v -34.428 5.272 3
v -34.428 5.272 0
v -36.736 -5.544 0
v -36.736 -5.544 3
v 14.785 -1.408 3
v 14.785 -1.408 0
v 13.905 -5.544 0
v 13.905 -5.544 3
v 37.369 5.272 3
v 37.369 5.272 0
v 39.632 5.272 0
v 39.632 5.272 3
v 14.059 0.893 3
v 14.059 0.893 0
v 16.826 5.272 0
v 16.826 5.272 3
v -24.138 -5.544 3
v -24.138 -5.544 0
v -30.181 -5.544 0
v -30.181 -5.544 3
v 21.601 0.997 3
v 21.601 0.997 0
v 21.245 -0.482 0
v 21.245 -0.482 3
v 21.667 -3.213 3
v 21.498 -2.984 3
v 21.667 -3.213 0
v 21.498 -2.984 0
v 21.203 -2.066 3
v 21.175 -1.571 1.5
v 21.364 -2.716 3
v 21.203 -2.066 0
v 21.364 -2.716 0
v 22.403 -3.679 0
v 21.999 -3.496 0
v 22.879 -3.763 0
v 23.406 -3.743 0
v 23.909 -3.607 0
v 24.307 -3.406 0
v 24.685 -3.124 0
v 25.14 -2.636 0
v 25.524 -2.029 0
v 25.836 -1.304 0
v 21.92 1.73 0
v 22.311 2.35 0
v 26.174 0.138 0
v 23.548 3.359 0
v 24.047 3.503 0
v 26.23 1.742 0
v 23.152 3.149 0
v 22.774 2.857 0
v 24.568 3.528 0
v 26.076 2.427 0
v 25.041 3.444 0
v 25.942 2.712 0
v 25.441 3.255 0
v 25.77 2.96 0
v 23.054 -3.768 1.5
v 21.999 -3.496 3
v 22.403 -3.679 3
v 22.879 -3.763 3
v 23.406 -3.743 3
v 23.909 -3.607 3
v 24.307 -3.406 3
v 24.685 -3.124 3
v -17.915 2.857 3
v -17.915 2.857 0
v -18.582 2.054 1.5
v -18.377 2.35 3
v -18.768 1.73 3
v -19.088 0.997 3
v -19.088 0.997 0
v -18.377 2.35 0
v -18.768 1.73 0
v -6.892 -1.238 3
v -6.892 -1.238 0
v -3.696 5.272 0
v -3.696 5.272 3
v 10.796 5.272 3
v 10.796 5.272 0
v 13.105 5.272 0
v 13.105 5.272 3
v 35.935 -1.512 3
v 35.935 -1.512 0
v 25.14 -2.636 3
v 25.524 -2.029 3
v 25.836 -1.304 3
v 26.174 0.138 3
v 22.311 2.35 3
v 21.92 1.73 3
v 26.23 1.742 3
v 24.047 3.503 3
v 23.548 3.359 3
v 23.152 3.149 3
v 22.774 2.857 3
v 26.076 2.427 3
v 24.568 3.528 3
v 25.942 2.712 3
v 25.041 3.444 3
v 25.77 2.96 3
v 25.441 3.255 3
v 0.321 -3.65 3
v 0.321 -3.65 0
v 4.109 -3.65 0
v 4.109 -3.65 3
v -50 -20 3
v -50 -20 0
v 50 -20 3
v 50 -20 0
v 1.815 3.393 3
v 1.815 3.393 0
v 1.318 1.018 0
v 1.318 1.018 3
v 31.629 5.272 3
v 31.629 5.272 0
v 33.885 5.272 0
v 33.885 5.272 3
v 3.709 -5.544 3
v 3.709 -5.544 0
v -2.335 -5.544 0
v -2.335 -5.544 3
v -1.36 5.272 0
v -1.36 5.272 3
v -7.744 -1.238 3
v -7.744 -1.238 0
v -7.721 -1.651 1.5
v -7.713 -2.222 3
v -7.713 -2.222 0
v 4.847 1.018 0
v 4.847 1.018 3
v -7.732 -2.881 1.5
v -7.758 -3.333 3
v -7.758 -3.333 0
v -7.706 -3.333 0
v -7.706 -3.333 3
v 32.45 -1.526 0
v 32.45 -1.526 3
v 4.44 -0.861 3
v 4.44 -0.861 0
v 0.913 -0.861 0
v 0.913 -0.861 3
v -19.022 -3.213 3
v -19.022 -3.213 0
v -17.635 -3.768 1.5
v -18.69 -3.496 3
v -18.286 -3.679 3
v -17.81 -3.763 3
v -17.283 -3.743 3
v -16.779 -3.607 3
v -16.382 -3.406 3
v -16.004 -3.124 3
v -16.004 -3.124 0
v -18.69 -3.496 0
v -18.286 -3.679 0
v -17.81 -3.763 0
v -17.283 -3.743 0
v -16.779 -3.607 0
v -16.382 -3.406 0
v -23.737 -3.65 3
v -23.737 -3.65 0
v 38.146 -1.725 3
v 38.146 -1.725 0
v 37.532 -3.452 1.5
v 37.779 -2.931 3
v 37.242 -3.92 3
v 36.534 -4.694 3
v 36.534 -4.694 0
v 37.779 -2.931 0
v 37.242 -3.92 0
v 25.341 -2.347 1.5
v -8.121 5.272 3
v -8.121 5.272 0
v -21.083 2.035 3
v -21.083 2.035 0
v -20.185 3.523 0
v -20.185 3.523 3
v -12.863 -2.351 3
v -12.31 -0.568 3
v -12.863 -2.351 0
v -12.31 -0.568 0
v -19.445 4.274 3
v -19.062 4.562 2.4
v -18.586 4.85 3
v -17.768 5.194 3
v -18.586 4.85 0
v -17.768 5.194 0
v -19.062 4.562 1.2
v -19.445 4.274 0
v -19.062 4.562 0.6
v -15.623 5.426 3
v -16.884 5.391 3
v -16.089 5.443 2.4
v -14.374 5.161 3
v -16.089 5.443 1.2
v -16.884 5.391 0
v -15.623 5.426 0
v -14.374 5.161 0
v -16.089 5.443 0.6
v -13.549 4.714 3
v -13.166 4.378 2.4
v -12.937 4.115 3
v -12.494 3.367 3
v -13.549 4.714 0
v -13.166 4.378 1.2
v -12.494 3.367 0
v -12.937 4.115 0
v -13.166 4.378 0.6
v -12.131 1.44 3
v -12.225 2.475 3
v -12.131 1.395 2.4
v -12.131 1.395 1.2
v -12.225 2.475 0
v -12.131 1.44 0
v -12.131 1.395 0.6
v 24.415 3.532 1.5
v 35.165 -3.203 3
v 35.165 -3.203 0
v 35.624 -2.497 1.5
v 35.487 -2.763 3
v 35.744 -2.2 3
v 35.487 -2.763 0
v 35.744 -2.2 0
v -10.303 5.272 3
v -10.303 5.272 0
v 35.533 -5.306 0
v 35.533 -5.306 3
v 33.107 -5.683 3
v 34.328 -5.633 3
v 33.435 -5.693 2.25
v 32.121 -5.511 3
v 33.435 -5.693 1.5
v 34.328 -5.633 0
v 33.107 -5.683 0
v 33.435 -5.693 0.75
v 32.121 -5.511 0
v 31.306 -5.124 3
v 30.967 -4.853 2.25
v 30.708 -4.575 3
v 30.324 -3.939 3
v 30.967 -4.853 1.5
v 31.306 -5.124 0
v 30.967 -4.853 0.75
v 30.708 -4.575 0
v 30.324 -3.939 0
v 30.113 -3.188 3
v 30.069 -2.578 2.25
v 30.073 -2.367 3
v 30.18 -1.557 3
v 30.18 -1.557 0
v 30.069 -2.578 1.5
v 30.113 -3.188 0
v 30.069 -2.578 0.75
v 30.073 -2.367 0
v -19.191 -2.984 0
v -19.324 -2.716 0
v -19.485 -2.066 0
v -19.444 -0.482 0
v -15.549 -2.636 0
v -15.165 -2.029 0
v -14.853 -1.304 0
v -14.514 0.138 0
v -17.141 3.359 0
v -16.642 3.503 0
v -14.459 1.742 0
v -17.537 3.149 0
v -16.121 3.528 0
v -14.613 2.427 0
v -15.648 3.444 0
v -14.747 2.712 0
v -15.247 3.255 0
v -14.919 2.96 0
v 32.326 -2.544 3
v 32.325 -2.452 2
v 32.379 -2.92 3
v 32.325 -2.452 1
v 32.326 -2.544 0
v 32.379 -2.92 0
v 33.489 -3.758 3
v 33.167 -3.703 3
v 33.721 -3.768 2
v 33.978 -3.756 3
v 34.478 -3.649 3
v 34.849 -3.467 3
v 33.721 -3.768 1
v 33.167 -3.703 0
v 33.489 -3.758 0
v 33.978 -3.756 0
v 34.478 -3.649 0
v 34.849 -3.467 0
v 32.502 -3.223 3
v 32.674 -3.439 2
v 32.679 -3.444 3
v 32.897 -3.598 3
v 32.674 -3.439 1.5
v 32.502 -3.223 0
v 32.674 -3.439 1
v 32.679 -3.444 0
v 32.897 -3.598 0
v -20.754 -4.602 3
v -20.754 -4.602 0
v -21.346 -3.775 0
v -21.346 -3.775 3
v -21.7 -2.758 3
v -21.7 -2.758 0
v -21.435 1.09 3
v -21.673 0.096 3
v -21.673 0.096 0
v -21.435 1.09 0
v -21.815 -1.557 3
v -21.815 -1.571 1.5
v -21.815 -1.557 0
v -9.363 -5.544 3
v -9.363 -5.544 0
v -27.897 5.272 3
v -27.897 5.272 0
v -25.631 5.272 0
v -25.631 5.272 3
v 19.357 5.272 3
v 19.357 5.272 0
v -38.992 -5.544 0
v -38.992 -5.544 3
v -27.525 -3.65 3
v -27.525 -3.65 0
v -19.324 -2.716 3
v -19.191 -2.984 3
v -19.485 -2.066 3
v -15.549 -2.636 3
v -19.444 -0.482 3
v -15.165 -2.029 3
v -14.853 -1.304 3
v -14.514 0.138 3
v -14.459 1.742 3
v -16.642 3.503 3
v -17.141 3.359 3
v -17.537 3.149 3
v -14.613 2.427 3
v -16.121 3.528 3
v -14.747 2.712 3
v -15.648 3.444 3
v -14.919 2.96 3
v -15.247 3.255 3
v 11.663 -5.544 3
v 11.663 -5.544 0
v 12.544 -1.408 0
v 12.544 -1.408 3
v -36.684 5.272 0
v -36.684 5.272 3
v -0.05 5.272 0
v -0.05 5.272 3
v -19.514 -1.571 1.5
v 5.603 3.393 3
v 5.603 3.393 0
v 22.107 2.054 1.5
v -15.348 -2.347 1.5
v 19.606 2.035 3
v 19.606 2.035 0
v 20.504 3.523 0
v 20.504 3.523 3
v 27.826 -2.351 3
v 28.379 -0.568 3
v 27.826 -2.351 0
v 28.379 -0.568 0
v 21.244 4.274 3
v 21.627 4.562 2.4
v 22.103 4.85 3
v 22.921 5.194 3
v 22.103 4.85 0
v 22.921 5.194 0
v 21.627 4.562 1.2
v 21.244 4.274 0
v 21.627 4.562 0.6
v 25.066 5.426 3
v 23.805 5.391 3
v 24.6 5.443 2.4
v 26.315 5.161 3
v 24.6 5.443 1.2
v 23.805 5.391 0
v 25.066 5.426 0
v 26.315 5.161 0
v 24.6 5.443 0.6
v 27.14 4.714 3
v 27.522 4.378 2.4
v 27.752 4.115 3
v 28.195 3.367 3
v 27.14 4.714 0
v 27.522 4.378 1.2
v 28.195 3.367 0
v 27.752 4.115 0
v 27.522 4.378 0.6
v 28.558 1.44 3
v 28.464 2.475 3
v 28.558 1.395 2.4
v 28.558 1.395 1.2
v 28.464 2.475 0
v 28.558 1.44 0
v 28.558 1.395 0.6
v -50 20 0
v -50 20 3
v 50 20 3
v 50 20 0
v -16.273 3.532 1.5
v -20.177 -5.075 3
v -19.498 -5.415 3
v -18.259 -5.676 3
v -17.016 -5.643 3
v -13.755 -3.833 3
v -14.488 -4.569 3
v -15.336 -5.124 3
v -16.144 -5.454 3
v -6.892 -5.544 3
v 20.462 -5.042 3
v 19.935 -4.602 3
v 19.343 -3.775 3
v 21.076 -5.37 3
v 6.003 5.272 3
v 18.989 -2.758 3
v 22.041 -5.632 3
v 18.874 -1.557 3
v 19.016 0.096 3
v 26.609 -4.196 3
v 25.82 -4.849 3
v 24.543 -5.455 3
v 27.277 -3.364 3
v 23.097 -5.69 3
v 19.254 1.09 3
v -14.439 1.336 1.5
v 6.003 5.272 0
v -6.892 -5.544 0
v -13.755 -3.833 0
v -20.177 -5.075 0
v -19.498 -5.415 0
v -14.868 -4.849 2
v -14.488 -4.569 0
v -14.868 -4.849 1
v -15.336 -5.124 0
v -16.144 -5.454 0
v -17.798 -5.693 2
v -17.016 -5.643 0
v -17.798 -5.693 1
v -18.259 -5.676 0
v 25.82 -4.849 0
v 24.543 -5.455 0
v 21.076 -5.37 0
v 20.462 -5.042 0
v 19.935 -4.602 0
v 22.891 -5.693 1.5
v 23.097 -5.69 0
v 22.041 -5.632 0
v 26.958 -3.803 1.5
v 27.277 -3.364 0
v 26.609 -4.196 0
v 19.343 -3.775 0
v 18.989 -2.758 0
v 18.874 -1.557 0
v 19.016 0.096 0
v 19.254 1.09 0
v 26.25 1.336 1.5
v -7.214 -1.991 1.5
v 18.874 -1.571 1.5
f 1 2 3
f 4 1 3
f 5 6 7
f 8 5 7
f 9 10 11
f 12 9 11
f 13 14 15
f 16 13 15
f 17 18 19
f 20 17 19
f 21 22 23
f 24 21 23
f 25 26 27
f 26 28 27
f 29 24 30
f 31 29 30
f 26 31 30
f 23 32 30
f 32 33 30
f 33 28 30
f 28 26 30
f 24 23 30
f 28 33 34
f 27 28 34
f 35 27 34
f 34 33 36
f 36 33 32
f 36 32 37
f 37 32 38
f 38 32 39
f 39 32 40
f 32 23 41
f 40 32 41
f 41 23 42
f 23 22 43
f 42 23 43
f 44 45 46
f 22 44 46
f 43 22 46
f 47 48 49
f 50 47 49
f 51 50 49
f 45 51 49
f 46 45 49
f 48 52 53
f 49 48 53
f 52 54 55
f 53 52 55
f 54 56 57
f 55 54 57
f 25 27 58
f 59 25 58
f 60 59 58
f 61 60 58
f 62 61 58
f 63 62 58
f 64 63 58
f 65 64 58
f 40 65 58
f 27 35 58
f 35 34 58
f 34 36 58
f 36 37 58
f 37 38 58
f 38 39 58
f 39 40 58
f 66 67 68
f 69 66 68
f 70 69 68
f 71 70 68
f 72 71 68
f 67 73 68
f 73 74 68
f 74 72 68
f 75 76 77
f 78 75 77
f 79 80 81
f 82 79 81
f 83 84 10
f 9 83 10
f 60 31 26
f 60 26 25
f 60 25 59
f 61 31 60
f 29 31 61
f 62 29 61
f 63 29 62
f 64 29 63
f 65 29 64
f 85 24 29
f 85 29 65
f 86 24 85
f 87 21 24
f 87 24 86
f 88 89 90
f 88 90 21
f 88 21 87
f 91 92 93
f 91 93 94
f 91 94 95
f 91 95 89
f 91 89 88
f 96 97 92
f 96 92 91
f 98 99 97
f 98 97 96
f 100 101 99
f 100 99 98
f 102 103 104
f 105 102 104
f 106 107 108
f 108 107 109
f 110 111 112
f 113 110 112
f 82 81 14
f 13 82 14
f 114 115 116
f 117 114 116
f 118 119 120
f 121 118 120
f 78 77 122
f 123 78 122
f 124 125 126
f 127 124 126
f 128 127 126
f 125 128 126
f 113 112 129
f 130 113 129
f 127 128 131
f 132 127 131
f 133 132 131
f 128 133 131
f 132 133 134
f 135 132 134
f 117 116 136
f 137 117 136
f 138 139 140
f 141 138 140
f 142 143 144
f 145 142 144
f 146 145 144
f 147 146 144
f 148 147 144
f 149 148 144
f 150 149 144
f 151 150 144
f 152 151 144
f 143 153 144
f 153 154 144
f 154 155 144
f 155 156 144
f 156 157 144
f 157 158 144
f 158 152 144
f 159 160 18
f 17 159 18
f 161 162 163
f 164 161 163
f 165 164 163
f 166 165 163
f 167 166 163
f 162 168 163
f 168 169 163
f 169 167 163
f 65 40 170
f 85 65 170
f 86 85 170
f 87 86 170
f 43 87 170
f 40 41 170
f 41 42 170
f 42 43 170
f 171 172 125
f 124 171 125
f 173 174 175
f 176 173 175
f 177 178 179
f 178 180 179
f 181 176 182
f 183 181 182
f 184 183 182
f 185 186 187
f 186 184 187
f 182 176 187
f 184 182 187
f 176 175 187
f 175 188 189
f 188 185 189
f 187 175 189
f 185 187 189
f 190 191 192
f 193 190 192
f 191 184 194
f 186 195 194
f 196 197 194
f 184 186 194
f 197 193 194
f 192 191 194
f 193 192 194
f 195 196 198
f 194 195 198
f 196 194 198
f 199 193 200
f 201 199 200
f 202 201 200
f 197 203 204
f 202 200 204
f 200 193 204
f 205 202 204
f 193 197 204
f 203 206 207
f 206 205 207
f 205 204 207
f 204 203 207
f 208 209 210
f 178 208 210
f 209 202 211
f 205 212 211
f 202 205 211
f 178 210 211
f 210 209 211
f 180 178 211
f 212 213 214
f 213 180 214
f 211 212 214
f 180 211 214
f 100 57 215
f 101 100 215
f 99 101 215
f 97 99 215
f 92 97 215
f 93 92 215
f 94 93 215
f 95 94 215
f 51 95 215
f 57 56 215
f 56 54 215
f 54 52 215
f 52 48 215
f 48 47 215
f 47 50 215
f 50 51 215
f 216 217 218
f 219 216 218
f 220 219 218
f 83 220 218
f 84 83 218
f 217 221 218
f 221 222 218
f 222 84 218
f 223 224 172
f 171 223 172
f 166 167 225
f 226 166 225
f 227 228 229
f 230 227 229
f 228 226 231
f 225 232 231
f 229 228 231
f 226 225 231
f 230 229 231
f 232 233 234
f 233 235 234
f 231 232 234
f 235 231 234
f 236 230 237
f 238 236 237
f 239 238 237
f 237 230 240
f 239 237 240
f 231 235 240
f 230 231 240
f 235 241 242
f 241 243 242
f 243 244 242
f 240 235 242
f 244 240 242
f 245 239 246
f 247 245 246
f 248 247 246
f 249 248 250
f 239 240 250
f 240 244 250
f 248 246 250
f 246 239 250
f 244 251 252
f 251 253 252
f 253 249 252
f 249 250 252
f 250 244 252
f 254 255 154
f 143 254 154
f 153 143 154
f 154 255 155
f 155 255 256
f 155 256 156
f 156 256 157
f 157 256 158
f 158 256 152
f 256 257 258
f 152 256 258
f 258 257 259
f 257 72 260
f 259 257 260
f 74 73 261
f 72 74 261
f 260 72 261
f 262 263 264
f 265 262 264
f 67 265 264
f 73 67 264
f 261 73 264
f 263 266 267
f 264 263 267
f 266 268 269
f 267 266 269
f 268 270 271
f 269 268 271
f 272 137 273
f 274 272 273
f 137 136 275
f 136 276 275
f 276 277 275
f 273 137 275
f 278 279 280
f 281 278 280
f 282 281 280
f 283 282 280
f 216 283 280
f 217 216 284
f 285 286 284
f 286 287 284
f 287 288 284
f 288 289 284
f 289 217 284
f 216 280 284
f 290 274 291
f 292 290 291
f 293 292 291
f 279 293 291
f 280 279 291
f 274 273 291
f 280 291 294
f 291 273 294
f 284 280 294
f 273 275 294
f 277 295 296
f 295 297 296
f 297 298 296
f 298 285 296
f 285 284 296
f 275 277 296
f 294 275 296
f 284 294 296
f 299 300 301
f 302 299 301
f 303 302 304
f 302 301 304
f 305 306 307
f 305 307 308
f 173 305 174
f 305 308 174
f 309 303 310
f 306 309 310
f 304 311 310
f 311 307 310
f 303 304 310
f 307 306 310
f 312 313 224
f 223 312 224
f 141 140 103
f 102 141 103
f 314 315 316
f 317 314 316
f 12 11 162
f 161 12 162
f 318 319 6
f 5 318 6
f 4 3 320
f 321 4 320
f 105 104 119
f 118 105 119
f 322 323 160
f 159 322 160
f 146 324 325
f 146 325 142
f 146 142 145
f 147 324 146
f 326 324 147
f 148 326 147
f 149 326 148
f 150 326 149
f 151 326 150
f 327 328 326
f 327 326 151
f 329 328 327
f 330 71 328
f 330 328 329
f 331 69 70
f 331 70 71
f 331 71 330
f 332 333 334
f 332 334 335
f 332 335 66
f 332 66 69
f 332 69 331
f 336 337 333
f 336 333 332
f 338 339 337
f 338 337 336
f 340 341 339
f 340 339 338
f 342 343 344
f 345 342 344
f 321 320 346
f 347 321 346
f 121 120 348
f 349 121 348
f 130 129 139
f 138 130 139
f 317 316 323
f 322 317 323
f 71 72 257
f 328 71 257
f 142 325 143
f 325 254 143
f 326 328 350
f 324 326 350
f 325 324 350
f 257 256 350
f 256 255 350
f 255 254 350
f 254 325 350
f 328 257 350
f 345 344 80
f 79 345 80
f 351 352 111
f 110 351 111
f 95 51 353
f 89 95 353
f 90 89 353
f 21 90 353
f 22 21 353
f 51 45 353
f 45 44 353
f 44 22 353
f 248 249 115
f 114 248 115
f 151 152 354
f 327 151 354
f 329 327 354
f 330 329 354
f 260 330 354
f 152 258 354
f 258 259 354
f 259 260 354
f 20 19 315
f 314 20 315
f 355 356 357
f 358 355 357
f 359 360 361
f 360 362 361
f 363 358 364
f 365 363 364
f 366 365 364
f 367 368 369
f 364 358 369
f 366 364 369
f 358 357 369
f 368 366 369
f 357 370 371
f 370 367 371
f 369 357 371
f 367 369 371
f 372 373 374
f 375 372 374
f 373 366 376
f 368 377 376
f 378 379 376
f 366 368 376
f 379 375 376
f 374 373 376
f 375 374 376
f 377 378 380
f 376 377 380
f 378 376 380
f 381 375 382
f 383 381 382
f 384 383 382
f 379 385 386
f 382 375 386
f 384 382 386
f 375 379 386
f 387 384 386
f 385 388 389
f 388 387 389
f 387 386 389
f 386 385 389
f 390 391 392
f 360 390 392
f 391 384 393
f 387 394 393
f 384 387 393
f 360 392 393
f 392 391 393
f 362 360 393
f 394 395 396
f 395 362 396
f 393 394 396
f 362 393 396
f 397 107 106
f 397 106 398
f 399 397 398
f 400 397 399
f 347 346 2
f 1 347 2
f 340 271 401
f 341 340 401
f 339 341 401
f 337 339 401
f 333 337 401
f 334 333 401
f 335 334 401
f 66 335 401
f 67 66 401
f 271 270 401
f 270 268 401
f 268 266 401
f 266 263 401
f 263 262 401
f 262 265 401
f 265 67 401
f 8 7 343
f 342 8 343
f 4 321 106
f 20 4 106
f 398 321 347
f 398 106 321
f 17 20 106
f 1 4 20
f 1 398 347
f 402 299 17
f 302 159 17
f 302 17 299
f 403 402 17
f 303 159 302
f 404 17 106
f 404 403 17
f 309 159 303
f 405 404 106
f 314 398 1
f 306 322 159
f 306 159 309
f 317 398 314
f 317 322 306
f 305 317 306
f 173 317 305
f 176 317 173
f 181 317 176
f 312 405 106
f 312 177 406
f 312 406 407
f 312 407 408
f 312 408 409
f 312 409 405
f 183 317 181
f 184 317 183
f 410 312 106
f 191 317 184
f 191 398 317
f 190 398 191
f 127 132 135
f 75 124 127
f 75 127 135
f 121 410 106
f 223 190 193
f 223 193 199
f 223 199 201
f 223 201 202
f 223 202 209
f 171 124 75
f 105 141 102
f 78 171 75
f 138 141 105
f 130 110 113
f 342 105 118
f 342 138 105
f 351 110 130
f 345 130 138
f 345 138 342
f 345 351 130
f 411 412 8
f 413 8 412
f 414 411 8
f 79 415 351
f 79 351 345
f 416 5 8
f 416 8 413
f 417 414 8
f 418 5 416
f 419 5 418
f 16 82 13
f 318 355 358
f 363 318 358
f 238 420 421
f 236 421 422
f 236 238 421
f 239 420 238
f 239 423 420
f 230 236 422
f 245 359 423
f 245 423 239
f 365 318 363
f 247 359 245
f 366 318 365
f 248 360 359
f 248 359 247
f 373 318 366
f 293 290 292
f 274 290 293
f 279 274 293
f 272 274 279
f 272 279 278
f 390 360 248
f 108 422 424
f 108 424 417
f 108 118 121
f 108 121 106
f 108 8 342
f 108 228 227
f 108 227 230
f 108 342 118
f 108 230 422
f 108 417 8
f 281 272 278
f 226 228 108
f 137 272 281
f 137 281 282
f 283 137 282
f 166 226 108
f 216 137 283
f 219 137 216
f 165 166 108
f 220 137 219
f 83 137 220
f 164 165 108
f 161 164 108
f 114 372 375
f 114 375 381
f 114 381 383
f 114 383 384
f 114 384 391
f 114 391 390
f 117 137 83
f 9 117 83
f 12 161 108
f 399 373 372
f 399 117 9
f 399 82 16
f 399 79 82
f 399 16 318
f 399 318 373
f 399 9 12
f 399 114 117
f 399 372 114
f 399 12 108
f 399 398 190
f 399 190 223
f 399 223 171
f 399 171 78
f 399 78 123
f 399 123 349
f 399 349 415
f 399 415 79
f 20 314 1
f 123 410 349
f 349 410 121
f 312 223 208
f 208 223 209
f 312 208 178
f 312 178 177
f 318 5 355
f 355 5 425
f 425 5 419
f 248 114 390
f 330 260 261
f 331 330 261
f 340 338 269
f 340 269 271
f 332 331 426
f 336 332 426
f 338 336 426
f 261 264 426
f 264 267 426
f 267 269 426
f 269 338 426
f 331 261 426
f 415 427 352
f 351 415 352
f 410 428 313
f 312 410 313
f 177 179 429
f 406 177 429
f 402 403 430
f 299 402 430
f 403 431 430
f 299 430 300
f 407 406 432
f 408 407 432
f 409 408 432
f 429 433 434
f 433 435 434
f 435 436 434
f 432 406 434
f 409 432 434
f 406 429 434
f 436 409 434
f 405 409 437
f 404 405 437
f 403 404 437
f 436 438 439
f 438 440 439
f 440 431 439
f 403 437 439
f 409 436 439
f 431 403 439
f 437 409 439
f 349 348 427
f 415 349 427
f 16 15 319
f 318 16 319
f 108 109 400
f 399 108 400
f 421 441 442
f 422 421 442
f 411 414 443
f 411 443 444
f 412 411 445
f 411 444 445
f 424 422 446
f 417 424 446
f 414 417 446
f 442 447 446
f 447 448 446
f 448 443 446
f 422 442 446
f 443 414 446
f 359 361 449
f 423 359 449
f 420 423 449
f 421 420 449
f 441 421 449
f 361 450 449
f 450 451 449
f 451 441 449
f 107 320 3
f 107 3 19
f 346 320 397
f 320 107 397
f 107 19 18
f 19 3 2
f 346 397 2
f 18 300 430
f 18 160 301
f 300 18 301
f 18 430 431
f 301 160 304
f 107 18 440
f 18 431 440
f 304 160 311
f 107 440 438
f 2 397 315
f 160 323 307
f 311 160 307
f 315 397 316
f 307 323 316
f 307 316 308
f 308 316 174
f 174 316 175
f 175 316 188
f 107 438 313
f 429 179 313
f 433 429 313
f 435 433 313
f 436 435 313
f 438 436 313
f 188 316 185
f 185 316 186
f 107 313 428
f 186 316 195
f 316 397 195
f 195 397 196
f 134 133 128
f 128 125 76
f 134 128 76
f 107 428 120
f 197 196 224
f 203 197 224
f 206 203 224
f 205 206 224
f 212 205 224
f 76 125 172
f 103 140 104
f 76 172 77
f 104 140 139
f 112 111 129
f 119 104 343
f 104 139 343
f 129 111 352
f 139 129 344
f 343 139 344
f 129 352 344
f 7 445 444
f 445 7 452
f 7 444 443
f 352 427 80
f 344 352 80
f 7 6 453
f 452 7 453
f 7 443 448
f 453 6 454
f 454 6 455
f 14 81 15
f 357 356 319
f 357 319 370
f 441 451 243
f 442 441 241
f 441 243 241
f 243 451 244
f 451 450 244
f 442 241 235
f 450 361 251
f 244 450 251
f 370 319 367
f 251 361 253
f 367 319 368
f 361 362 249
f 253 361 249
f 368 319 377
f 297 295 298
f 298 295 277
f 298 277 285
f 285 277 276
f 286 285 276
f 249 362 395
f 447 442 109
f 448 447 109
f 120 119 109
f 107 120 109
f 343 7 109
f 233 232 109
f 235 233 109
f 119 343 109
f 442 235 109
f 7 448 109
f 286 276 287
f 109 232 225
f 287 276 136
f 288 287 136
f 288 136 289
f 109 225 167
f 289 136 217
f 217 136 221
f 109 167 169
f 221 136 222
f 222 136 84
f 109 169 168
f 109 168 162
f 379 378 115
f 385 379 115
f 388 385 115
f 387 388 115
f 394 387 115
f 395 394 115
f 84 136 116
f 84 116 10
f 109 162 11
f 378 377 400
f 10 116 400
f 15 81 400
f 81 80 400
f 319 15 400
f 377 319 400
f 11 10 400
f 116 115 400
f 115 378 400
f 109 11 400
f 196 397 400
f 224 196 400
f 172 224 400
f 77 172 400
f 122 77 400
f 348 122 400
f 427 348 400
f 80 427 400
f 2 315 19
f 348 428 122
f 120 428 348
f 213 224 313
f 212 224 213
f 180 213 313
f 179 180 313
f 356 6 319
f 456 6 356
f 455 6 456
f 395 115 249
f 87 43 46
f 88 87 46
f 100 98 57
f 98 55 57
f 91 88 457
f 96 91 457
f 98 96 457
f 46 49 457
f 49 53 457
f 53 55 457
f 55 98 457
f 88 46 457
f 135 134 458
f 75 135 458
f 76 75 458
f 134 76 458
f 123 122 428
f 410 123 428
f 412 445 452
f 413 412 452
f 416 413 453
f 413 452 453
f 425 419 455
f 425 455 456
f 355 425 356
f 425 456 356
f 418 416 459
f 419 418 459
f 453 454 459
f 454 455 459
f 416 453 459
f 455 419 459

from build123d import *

# Parameters (mm, degrees)
F1_DEPTH = 3
F0_W     = 100
F0_H     = 40


with BuildPart() as f1:
    # F0 (on Top) → F1 (new body)
    with BuildSketch(Plane.XY):
        with BuildLine():
            add(Edge.make_bspline(
                [(-14.9193627329, 2.9595110785), (-15.3999214119, 3.5323938388), (-16.2734492571, 3.5323938388)],
                knots=[0, 0, 0, 1, 1, 1], degree=2))
            add(Edge.make_bspline(
                [(-16.2734492571, 3.5323938388), (-17.1682826595, 3.5323938388), (-17.9151608035, 2.8565342187)],
                knots=[0, 0, 0, 1, 1, 1], degree=2))
            add(Edge.make_bspline(
                [(-17.9151608035, 2.8565342187), (-18.6620389476, 2.1806745987), (-19.0881500916, 0.9970325321)],
                knots=[0, 0, 0, 1, 1, 1], degree=2))
            add(Edge.make_bspline(
                [(-19.0881500916, 0.9970325321), (-19.5142612356, -0.1866095346), (-19.5142612356, -1.5714707525)],
                knots=[0, 0, 0, 1, 1, 1], degree=2))
            add(Edge.make_bspline(
                [(-19.5142612356, -1.5714707525), (-19.5142612356, -2.6580541697), (-19.0218661358, -3.213182299)],
                knots=[0, 0, 0, 1, 1, 1], degree=2))
            add(Edge.make_bspline(
                [(-19.0218661358, -3.213182299), (-18.5294710361, -3.7683104282), (-17.6346376337, -3.7683104282)],
                knots=[0, 0, 0, 1, 1, 1], degree=2))
            add(Edge.make_bspline(
                [(-17.6346376337, -3.7683104282), (-16.7398042314, -3.7683104282), (-16.0035788659, -3.124409144)],
                knots=[0, 0, 0, 1, 1, 1], degree=2))
            add(Edge.make_bspline(
                [(-16.0035788659, -3.124409144), (-15.2673535005, -2.4805078597), (-14.8530787771, -1.3039676455)],
                knots=[0, 0, 0, 1, 1, 1], degree=2))
            add(Edge.make_bspline(
                [(-14.8530787771, -1.3039676455), (-14.4388040538, -0.1274274312), (-14.4388040538, 1.3355541631)],
                knots=[0, 0, 0, 1, 1, 1], degree=2))
            add(Edge.make_bspline(
                [(-14.4388040538, 1.3355541631), (-14.4388040538, 2.3866283183), (-14.9193627329, 2.9595110785)],
                knots=[0, 0, 0, 1, 1, 1], degree=2))
        make_face()
    extrude(amount=F1_DEPTH)


with BuildPart() as f1b:
    # F0 (on Top) → F1, piece 2 (new body)
    with BuildSketch(Plane.XY):
        with BuildLine():
            add(Edge.make_bspline(
                [(25.7695169499, 2.9595110785), (25.2889582709, 3.5323938388), (24.4154304257, 3.5323938388)],
                knots=[0, 0, 0, 1, 1, 1], degree=2))
            add(Edge.make_bspline(
                [(24.4154304257, 3.5323938388), (23.5205970233, 3.5323938388), (22.7737188793, 2.8565342187)],
                knots=[0, 0, 0, 1, 1, 1], degree=2))
            add(Edge.make_bspline(
                [(22.7737188793, 2.8565342187), (22.0268407352, 2.1806745987), (21.6007295912, 0.9970325321)],
                knots=[0, 0, 0, 1, 1, 1], degree=2))
            add(Edge.make_bspline(
                [(21.6007295912, 0.9970325321), (21.1746184472, -0.1866095346), (21.1746184472, -1.5714707525)],
                knots=[0, 0, 0, 1, 1, 1], degree=2))
            add(Edge.make_bspline(
                [(21.1746184472, -1.5714707525), (21.1746184472, -2.6580541697), (21.6670135469, -3.213182299)],
                knots=[0, 0, 0, 1, 1, 1], degree=2))
            add(Edge.make_bspline(
                [(21.6670135469, -3.213182299), (22.1594086467, -3.7683104282), (23.054242049, -3.7683104282)],
                knots=[0, 0, 0, 1, 1, 1], degree=2))
            add(Edge.make_bspline(
                [(23.054242049, -3.7683104282), (23.9490754514, -3.7683104282), (24.6853008169, -3.124409144)],
                knots=[0, 0, 0, 1, 1, 1], degree=2))
            add(Edge.make_bspline(
                [(24.6853008169, -3.124409144), (25.4215261823, -2.4805078597), (25.8358009056, -1.3039676455)],
                knots=[0, 0, 0, 1, 1, 1], degree=2))
            add(Edge.make_bspline(
                [(25.8358009056, -1.3039676455), (26.250075629, -0.1274274312), (26.250075629, 1.3355541631)],
                knots=[0, 0, 0, 1, 1, 1], degree=2))
            add(Edge.make_bspline(
                [(26.250075629, 1.3355541631), (26.250075629, 2.3866283183), (25.7695169499, 2.9595110785)],
                knots=[0, 0, 0, 1, 1, 1], degree=2))
        make_face()
    extrude(amount=F1_DEPTH)


with BuildPart() as f1c:
    # F0 (on Top) → F1, piece 3 (new body)
    with BuildSketch(Plane.XY):
        Rectangle(F0_W, F0_H)
        Polygon((-36.7362533052, -5.5437735282), (-38.9922750842, -5.5437735282), (-36.6841730542, 5.2723476768), (-34.4281512752, 5.2723476768), align=None, mode=Mode.SUBTRACT)
        Polygon((-24.1375671479, -5.5437735282), (-30.1812435401, -5.5437735282), (-27.8968143515, 5.2723476768), (-25.631323436, 5.2723476768), (-27.5251507426, -3.6499462216), (-23.7374961293, -3.6499462216), align=None, mode=Mode.SUBTRACT)
        with BuildLine():
            add(Edge.make_bspline(
                [(-13.1663888322, 4.3775142744), (-12.1307020239, 3.3122364144), (-12.1307020239, 1.3947362664)],
                knots=[0, 0, 0, 1, 1, 1], degree=2))
            add(Edge.make_bspline(
                [(-12.1307020239, 1.3947362664), (-12.1307020239, -0.6979429074), (-12.8633764631, -2.3514908745)],
                knots=[0, 0, 0, 1, 1, 1], degree=2))
            add(Edge.make_bspline(
                [(-12.8633764631, -2.3514908745), (-13.5960509024, -4.0050388416), (-14.868466124, -4.8489756351)],
                knots=[0, 0, 0, 1, 1, 1], degree=2))
            add(Edge.make_bspline(
                [(-14.868466124, -4.8489756351), (-16.1408813456, -5.6929124286), (-17.7979802389, -5.6929124286)],
                knots=[0, 0, 0, 1, 1, 1], degree=2))
            add(Edge.make_bspline(
                [(-17.7979802389, -5.6929124286), (-19.6918075456, -5.6929124286), (-20.7535344793, -4.6015944431)],
                knots=[0, 0, 0, 1, 1, 1], degree=2))
            add(Edge.make_bspline(
                [(-20.7535344793, -4.6015944431), (-21.8152614131, -3.5102764577), (-21.8152614131, -1.5714707525)],
                knots=[0, 0, 0, 1, 1, 1], degree=2))
            add(Edge.make_bspline(
                [(-21.8152614131, -1.5714707525), (-21.8152614131, 0.3886405098), (-21.0825869739, 2.0350866245)],
                knots=[0, 0, 0, 1, 1, 1], degree=2))
            add(Edge.make_bspline(
                [(-21.0825869739, 2.0350866245), (-20.3499125346, 3.6815327392), (-19.0621099661, 4.5621624368)],
                knots=[0, 0, 0, 1, 1, 1], degree=2))
            add(Edge.make_bspline(
                [(-19.0621099661, 4.5621624368), (-17.7743073976, 5.4427921344), (-16.0888010947, 5.4427921344)],
                knots=[0, 0, 0, 1, 1, 1], degree=2))
            add(Edge.make_bspline(
                [(-16.0888010947, 5.4427921344), (-14.2020756405, 5.4427921344), (-13.1663888322, 4.3775142744)],
                knots=[0, 0, 0, 1, 1, 1], degree=2))
        make_face(mode=Mode.SUBTRACT)
        with BuildLine():
            Line((-7.7583282297, -3.3327301477), (-7.7062479788, -3.3327301477))
            add(Edge.make_bspline(
                [(-7.7062479788, -3.3327301477), (-7.1286306503, -1.6969368116), (-6.8919022369, -1.2376836898)],
                knots=[0, 0, 0, 1, 1, 1], degree=2))
            Line((-6.8919022369, -1.2376836898), (-3.696068657, 5.2723476768))
            Line((-3.696068657, 5.2723476768), (-1.3595592175, 5.2723476768))
            Line((-1.3595592175, 5.2723476768), (-6.8919022369, -5.5437735282))
            Line((-6.8919022369, -5.5437735282), (-9.3633468721, -5.5437735282))
            Line((-9.3633468721, -5.5437735282), (-10.303158673, 5.2723476768))
            Line((-10.303158673, 5.2723476768), (-8.1205227021, 5.2723476768))
            Line((-8.1205227021, 5.2723476768), (-7.7441245249, -1.2376836898))
            add(Edge.make_bspline(
                [(-7.7441245249, -1.2376836898), (-7.7133498312, -1.5714707525), (-7.7133498312, -2.2224738892)],
                knots=[0, 0, 0, 1, 1, 1], degree=2))
            add(Edge.make_bspline(
                [(-7.7133498312, -2.2224738892), (-7.727553536, -2.9847393801), (-7.7583282297, -3.3327301477)],
                knots=[0, 0, 0, 1, 1, 1], degree=2))
        make_face(mode=Mode.SUBTRACT)
        Polygon((4.1088671304, -3.6499462216), (3.7087961119, -5.5437735282), (-2.3348802804, -5.5437735282), (-0.0504510917, 5.2723476768), (6.002694437, 5.2723476768), (5.6026234185, 3.3927240749), (1.8149688053, 3.3927240749), (1.3178391373, 1.0183380893), (4.84745978, 1.0183380893), (4.4402869091, -0.8612855126), (0.9130335505, -0.8612855126), (0.3212125172, -3.6499462216), align=None, mode=Mode.SUBTRACT)
        Polygon((13.1045468369, 5.2723476768), (14.0585623426, 0.8928720302), (16.8259174944, 5.2723476768), (19.3565442329, 5.2723476768), (14.7853185715, -1.4081281474), (13.9046888739, -5.5437735282), (11.6628707997, -5.5437735282), (12.5435004973, -1.4081281474), (10.7964448069, 5.2723476768), align=None, mode=Mode.SUBTRACT)
        with BuildLine():
            add(Edge.make_bspline(
                [(27.5224908506, 4.3775142744), (28.5581776589, 3.3122364144), (28.5581776589, 1.3947362664)],
                knots=[0, 0, 0, 1, 1, 1], degree=2))
            add(Edge.make_bspline(
                [(28.5581776589, 1.3947362664), (28.5581776589, -0.6979429074), (27.8255032197, -2.3514908745)],
                knots=[0, 0, 0, 1, 1, 1], degree=2))
            add(Edge.make_bspline(
                [(27.8255032197, -2.3514908745), (27.0928287804, -4.0050388416), (25.8204135588, -4.8489756351)],
                knots=[0, 0, 0, 1, 1, 1], degree=2))
            add(Edge.make_bspline(
                [(25.8204135588, -4.8489756351), (24.5479983371, -5.6929124286), (22.8908994438, -5.6929124286)],
                knots=[0, 0, 0, 1, 1, 1], degree=2))
            add(Edge.make_bspline(
                [(22.8908994438, -5.6929124286), (20.9970721372, -5.6929124286), (19.9353452035, -4.6015944431)],
                knots=[0, 0, 0, 1, 1, 1], degree=2))
            add(Edge.make_bspline(
                [(19.9353452035, -4.6015944431), (18.8736182697, -3.5102764577), (18.8736182697, -1.5714707525)],
                knots=[0, 0, 0, 1, 1, 1], degree=2))
            add(Edge.make_bspline(
                [(18.8736182697, -1.5714707525), (18.8736182697, 0.3886405098), (19.6062927089, 2.0350866245)],
                knots=[0, 0, 0, 1, 1, 1], degree=2))
            add(Edge.make_bspline(
                [(19.6062927089, 2.0350866245), (20.3389671482, 3.6815327392), (21.6267697167, 4.5621624368)],
                knots=[0, 0, 0, 1, 1, 1], degree=2))
            add(Edge.make_bspline(
                [(21.6267697167, 4.5621624368), (22.9145722852, 5.4427921344), (24.6000785881, 5.4427921344)],
                knots=[0, 0, 0, 1, 1, 1], degree=2))
            add(Edge.make_bspline(
                [(24.6000785881, 5.4427921344), (26.4868040423, 5.4427921344), (27.5224908506, 4.3775142744)],
                knots=[0, 0, 0, 1, 1, 1], degree=2))
        make_face(mode=Mode.SUBTRACT)
        with BuildLine():
            Line((37.369209203, 5.2723476768), (39.6323328344, 5.2723476768))
            Line((39.6323328344, 5.2723476768), (38.1456783987, -1.7253442212))
            add(Edge.make_bspline(
                [(38.1456783987, -1.7253442212), (37.724301823, -3.6949246201), (36.5335579039, -4.6939185243)],
                knots=[0, 0, 0, 1, 1, 1], degree=2))
            add(Edge.make_bspline(
                [(36.5335579039, -4.6939185243), (35.3428139849, -5.6929124286), (33.4347829735, -5.6929124286)],
                knots=[0, 0, 0, 1, 1, 1], degree=2))
            add(Edge.make_bspline(
                [(33.4347829735, -5.6929124286), (31.8652735931, -5.6929124286), (30.9668892645, -4.8525265613)],
                knots=[0, 0, 0, 1, 1, 1], degree=2))
            add(Edge.make_bspline(
                [(30.9668892645, -4.8525265613), (30.0685049359, -4.012140694), (30.0685049359, -2.5775665092)],
                knots=[0, 0, 0, 1, 1, 1], degree=2))
            add(Edge.make_bspline(
                [(30.0685049359, -2.5775665092), (30.0685049359, -2.0449275792), (30.1797672902, -1.5572670477)],
                knots=[0, 0, 0, 1, 1, 1], degree=2))
            Line((30.1797672902, -1.5572670477), (31.6285451798, 5.2723476768))
            Line((31.6285451798, 5.2723476768), (33.8845669588, 5.2723476768))
            Line((33.8845669588, 5.2723476768), (32.449992774, -1.526492354))
            add(Edge.make_bspline(
                [(32.449992774, -1.526492354), (32.324526715, -2.0733349888), (32.324526715, -2.4521004501)],
                knots=[0, 0, 0, 1, 1, 1], degree=2))
            add(Edge.make_bspline(
                [(32.324526715, -2.4521004501), (32.324526715, -3.7683104282), (33.7212243536, -3.7683104282)],
                knots=[0, 0, 0, 1, 1, 1], degree=2))
            add(Edge.make_bspline(
                [(33.7212243536, -3.7683104282), (34.6326287449, -3.7683104282), (35.1652676749, -3.2025295204)],
                knots=[0, 0, 0, 1, 1, 1], degree=2))
            add(Edge.make_bspline(
                [(35.1652676749, -3.2025295204), (35.6979066049, -2.6367486125), (35.9346350182, -1.5122886492)],
                knots=[0, 0, 0, 1, 1, 1], degree=2))
            Line((35.9346350182, -1.5122886492), (37.369209203, 5.2723476768))
        make_face(mode=Mode.SUBTRACT)
    extrude(amount=F1_DEPTH)


solid = Compound([f1.part, f1b.part, f1c.part])
